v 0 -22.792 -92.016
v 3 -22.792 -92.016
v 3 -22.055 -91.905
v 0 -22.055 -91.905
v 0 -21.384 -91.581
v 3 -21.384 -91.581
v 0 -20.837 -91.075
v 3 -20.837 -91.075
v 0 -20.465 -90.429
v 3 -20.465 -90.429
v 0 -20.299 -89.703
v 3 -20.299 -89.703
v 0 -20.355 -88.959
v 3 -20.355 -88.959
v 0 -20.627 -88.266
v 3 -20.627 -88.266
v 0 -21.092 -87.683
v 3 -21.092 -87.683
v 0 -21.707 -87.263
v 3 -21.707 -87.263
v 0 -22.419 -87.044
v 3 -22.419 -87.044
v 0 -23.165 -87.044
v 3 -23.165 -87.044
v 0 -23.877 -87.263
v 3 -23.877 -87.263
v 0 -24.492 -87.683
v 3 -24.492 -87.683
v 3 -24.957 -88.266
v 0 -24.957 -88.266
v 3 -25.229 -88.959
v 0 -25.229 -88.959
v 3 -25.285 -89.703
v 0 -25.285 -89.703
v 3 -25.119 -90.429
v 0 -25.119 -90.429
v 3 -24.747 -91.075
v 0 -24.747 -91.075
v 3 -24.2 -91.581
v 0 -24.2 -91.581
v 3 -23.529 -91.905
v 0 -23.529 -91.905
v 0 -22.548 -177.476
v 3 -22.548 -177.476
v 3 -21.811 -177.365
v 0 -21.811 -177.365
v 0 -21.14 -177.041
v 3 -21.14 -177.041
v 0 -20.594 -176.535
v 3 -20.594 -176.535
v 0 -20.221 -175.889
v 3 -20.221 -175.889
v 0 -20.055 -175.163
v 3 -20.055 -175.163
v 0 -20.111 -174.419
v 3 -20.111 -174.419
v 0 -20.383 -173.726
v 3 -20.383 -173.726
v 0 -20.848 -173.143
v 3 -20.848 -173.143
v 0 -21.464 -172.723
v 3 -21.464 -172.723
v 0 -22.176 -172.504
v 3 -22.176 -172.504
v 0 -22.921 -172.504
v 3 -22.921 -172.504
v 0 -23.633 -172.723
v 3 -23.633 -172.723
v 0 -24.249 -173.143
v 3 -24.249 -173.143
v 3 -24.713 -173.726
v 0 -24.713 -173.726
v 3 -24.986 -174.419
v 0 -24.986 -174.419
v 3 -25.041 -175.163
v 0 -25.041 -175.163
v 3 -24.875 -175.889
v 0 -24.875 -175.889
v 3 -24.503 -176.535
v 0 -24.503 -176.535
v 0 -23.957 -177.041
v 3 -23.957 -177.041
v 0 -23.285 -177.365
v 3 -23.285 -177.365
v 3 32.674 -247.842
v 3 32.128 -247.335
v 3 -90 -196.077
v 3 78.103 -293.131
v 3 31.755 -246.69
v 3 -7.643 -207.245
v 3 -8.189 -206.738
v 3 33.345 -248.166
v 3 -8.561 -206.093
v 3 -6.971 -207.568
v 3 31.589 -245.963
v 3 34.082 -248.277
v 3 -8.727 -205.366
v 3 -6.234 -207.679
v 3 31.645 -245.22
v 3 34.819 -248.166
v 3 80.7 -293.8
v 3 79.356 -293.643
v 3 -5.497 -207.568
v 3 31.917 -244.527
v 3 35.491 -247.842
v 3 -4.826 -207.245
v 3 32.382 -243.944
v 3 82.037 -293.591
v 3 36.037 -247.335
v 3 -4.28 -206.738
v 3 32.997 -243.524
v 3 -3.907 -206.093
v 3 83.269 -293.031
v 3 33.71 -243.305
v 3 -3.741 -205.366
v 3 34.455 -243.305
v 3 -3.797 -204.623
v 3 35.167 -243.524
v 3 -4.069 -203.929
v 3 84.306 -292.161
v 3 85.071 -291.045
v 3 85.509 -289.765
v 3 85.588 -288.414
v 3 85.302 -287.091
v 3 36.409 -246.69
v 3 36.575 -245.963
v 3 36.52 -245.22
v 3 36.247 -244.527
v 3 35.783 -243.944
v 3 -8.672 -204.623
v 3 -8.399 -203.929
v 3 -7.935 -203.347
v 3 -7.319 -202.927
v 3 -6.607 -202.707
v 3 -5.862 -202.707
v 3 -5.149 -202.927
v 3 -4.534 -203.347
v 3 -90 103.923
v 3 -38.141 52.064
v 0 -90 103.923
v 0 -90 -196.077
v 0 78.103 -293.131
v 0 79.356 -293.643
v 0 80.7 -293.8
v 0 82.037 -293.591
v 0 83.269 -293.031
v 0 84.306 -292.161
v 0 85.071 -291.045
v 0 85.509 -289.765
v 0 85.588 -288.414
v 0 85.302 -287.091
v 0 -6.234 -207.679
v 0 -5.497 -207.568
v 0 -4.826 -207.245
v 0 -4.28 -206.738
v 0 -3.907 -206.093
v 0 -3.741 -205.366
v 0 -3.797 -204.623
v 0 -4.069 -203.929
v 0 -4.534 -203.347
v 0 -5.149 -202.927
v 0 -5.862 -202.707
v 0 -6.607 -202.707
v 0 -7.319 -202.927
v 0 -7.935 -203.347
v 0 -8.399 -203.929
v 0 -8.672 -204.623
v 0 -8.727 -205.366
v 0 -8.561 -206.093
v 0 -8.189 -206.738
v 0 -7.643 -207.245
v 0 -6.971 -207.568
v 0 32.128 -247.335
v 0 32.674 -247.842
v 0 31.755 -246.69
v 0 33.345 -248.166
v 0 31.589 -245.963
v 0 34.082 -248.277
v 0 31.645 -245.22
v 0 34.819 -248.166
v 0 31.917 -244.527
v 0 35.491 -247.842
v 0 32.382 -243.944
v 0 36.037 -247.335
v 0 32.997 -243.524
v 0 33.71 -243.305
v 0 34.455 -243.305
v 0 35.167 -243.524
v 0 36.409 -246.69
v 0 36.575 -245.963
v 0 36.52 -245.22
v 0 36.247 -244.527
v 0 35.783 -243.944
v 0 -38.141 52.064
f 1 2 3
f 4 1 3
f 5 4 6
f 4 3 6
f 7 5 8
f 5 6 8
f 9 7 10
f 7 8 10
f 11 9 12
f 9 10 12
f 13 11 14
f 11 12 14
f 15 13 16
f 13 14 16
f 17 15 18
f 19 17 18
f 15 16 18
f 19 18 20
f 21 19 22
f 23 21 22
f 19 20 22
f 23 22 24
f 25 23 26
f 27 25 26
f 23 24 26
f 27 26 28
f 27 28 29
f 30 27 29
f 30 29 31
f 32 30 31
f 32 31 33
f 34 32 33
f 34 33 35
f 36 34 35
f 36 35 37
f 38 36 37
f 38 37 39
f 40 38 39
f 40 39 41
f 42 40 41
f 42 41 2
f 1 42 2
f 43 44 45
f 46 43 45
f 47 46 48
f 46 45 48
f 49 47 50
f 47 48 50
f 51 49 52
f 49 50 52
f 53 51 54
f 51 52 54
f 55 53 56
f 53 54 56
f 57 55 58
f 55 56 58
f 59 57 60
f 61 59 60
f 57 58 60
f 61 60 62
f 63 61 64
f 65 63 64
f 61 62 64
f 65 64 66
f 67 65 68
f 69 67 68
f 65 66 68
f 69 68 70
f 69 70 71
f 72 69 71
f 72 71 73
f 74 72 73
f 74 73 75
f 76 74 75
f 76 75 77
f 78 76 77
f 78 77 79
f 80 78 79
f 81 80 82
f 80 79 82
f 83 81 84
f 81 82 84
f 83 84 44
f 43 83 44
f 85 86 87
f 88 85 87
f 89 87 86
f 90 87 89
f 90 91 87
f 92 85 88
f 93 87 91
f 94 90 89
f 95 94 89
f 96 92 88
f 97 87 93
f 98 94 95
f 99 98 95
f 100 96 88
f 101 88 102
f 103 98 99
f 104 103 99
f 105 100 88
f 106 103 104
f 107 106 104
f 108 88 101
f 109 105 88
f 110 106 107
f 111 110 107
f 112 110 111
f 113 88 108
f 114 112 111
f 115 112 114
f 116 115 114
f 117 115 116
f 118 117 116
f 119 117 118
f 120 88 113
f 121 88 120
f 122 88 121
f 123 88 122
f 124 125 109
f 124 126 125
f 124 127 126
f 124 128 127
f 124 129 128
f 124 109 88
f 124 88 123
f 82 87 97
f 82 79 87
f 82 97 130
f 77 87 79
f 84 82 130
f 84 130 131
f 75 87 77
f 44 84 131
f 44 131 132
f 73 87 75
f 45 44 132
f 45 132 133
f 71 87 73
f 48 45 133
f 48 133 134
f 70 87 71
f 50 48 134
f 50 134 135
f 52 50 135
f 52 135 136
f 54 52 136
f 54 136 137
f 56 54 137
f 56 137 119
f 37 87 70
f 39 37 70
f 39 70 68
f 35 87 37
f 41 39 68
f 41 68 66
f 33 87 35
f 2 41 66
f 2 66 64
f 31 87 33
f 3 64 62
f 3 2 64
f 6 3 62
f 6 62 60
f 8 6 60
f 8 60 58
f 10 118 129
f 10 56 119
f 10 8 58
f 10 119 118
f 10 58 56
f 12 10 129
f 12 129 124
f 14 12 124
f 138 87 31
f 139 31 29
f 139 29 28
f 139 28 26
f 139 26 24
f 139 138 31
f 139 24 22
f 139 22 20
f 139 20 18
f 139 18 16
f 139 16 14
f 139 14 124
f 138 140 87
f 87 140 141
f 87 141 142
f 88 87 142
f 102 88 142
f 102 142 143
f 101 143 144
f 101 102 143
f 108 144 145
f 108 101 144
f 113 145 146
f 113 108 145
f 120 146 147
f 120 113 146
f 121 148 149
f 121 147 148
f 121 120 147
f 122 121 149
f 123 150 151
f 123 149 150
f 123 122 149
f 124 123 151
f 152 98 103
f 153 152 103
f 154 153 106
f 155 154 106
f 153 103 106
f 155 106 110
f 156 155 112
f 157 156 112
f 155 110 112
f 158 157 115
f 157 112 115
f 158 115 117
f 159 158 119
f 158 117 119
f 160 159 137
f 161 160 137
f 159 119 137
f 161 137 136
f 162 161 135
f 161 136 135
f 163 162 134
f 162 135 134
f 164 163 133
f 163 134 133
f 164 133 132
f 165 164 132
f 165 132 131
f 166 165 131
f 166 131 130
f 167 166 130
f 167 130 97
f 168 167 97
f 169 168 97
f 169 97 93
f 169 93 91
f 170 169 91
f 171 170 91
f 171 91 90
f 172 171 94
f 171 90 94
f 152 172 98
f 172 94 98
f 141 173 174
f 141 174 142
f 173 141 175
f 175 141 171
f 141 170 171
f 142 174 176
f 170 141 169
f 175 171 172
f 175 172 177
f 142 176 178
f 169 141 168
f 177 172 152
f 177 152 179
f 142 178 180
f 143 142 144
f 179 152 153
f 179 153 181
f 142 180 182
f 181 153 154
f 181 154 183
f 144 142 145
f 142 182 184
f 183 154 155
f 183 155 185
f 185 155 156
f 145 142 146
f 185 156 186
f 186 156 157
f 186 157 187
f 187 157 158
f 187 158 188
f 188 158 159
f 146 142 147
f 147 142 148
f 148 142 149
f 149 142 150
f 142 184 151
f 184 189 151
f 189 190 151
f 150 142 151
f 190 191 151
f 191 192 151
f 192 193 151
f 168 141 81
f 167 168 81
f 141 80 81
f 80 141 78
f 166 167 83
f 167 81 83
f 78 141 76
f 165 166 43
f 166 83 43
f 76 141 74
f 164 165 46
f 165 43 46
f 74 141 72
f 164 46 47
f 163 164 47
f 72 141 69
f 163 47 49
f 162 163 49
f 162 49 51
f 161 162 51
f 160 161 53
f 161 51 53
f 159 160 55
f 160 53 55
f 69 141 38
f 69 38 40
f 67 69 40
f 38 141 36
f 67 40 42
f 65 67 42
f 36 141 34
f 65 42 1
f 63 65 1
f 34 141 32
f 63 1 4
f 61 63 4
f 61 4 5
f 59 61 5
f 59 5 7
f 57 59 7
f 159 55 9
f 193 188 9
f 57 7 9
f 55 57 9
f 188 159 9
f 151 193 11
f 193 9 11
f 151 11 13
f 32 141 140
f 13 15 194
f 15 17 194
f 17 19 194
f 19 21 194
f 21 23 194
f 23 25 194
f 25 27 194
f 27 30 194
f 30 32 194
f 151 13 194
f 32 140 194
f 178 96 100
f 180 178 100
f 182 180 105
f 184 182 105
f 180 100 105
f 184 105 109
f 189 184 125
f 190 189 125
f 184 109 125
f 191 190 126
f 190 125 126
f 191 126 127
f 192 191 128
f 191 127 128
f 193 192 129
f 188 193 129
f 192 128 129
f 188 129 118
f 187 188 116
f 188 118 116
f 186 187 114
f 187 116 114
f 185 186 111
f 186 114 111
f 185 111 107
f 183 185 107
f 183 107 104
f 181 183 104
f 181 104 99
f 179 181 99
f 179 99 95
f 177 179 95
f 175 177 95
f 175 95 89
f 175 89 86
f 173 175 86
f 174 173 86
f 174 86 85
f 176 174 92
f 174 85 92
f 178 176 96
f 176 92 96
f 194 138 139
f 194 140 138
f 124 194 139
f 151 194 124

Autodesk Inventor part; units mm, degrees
ref_plane "YZ Plane" through (0, 0, 0) normal (1, 0, 0) x (0, 1, 0)
ref_plane "XZ Plane" through (0, 0, 0) normal (0, 1, 0) x (-1, 0, 0)
ref_plane "XY Plane" through (0, 0, 0) normal (0, 0, 1) x (1, 0, 0)
sketch "スケッチ1" plane through (0, 0, 0) normal (1, 0, 0) x (0, 1, 0)
  line L0 (-90, 103.923) -> (-90, -196.077)
  line L1 (-90, -196.077) -> (90, -300)
  line L2 (-126, 0) -> (126, 0) projected
  line L3 (0, -380.7846) -> (0, 184.7077) projected
  line L4 (-90, 103.923) -> (-38.1407, 52.0638)
  line L5 (-38.1407, 52.0638) -> (90, -300)
  dimension "d0" = 300
  dimension "d5" = 90
  dimension "d6" = 300
  dimension "d7" = 90
  dimension "d32" = 20
  dimension "d33" = 40
  dimension "d34" = 45
extrude "押し出し1" add sketch "スケッチ1" along normal blind 3 contours L4 L5 L2 L0 | L2 L5 L3 L1 L0 | L3 L5 L1
fillet "フィレット1" radius 5 1 edges at (1.5, 90, -300)
sketch "スケッチ3" plane through (3, 0, 0) normal (1, 0, 0) x (0, 0, -1)
  circle A0 centre (245.7766, 34.0822) radius 2.5
  line L0 (196.077, -90) -> (293.1313, 78.1031) projected
  line L1 (287.0911, 85.3015) -> (-52.0638, -38.1407) projected
  circle A1 centre (205.1793, -6.2342) radius 2.5
  circle A2 centre (174.9758, -22.5483) radius 2.5
  circle A3 centre (89.5158, -22.792) radius 2.5
  line L2 (89.5158, -22.792) -> (174.9758, -22.5483)
  point P0 (0, 0)
  dimension "d36" = 34
  dimension "d37" = 5
  dimension "d38" = 5
  dimension "d40" = 58
  dimension "d41" = 63
  dimension "d42" = 34
  dimension "d43" = 5
  dimension "d44" = 5
  dimension "d45" = 19
  dimension "d46" = 34
  dimension "d47" = 52
  dimension "d51" = 85.46
extrude "押し出し3" cut sketch "スケッチ3" against normal through all
properties part number "stay_middle" material "アルミニウム 6061"
